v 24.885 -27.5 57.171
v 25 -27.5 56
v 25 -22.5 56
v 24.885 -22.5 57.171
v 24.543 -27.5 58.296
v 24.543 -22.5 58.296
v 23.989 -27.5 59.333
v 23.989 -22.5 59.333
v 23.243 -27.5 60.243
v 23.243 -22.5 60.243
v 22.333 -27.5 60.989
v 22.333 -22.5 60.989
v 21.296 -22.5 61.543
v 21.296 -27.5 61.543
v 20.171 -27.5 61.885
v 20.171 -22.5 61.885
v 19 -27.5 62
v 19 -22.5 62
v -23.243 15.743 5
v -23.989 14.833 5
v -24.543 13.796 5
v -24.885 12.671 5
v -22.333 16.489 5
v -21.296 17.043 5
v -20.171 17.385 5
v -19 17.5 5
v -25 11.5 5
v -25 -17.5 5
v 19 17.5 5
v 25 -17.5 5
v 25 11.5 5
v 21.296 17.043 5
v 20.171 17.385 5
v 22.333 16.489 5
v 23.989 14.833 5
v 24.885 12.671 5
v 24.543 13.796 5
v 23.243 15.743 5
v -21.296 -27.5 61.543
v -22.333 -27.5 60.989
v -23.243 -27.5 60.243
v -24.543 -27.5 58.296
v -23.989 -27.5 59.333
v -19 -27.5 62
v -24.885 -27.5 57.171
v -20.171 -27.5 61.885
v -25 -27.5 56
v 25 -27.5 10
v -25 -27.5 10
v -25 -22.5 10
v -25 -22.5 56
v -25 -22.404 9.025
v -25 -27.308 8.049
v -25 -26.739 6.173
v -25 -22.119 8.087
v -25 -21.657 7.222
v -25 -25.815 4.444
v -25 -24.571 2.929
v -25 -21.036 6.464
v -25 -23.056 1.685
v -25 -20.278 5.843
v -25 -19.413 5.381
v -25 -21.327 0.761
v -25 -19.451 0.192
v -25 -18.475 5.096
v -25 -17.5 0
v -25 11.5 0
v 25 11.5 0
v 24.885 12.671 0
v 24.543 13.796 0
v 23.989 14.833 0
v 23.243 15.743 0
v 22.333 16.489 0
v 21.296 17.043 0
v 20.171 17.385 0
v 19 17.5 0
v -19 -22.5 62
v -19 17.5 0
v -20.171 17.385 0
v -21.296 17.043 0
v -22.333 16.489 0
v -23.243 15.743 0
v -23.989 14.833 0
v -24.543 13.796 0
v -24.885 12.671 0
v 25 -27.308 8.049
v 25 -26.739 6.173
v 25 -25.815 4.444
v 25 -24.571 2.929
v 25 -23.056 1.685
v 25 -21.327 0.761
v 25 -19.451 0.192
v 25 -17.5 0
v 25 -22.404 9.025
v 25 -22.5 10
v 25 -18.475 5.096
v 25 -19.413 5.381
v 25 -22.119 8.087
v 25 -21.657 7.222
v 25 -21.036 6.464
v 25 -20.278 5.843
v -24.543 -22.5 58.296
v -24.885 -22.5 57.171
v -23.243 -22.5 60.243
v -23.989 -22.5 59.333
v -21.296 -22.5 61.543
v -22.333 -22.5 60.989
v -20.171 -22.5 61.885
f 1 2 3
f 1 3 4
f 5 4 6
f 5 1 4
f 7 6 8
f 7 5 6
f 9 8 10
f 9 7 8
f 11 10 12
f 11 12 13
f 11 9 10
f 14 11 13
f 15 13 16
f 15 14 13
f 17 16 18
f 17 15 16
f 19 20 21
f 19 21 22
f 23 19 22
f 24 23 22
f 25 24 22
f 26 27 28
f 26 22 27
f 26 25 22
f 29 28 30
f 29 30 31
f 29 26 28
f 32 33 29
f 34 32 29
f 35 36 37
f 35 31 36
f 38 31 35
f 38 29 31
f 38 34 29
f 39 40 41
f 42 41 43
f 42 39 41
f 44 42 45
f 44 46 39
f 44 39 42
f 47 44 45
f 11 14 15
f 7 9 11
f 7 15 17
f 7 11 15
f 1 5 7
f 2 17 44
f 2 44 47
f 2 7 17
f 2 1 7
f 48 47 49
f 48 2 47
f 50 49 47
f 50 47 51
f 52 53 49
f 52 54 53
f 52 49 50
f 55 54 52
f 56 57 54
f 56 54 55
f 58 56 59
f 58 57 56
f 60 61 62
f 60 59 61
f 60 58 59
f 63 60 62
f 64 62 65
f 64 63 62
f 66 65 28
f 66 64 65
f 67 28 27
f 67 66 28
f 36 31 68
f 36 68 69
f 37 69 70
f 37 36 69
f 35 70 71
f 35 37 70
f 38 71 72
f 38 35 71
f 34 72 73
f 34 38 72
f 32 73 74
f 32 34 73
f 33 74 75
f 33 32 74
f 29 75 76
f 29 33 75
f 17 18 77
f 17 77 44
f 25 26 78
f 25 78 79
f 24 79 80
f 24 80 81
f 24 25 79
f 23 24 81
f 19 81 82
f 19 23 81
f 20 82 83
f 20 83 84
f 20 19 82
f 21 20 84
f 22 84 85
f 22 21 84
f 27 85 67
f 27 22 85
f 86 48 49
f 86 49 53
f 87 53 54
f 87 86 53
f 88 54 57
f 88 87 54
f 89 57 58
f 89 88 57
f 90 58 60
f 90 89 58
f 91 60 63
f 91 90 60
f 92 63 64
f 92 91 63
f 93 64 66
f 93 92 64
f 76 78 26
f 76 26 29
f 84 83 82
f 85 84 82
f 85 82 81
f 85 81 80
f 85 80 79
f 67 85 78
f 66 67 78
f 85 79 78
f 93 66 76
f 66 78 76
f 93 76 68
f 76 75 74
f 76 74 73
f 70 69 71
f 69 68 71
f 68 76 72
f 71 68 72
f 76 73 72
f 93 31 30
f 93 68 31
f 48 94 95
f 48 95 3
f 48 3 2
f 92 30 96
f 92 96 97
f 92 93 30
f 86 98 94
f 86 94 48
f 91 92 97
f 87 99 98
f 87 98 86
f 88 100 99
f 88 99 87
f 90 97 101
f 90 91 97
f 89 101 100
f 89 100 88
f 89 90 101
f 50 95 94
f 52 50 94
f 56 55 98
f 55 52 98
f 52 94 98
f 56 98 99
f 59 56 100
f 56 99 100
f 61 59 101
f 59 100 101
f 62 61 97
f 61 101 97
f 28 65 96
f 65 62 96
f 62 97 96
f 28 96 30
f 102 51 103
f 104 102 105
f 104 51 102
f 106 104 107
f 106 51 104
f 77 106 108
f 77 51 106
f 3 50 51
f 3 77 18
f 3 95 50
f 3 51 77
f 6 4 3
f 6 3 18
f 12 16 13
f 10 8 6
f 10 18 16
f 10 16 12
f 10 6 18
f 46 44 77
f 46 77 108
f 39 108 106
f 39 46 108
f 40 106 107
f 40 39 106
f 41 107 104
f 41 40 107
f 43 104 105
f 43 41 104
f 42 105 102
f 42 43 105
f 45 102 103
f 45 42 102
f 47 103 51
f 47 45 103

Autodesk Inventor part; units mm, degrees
ref_plane "YZ Plane" through (0, 0, 0) normal (1, 0, 0) x (0, 1, 0)
ref_plane "XZ Plane" through (0, 0, 0) normal (0, 1, 0) x (-1, 0, 0)
ref_plane "XY Plane" through (0, 0, 0) normal (0, 0, 1) x (1, 0, 0)
sketch "Schizzo1" plane through (0, 0, 0) normal (0, 0, 1) x (1, 0, 0)
  line L0 (-25, 17.5) -> (25, 17.5)
  line L1 (25, 17.5) -> (25, -17.5)
  line L2 (25, -17.5) -> (-25, -17.5)
  line L3 (-25, -17.5) -> (-25, 17.5)
  line L4 (-25, 17.5) -> (25, -17.5) construction
  line L5 (25, 17.5) -> (-25, -17.5) construction
  point P0 (0, 0)
  dimension "d0" = 50
  dimension "d1" = 35
extrude "Piano1" add sketch "Schizzo1" along normal blind 5
sketch "Schizzo2" plane through (25, -22.5, 10) normal (0, -1, 0) x (1, 0, 0)
  line L0 (-50, 0) -> (0, 0)
  line L1 (0, 0) -> (0, 52)
  line L2 (0, 52) -> (-50, 52)
  line L3 (-50, 52) -> (-50, 0)
edge flange "Flangia1" height 62 angle 90 thickness 5 bend radius 5 thickness toward (0, -1, 0) relief tear relief width 5 relief depth 2.5 edges at (0, -17.5, 5) wall of the first edge with corners at (-25, -22.5, 10) (25, -22.5, 10) (25, -22.5, 62) (-25, -22.5, 62)
bend "Piega (Bend)1"
corner "Angolo1"
fillet "Arrotondamento angolo1" radius 6 4 edges at (-25, 17.5, 2.5) (25, 17.5, 2.5) (25, -25, 62) (-25, -25, 62)
equation "\"d2\" = Spessore"
equation "\"d3\" = LarghezzaScaricoPiega"
equation "\"d4\" = ProfonditàScaricoPiega"
equation "\"d5\" = ResiduoMinimo"
equation "\"d6\" = RaggioTransizione"
equation "\"d9\" = RaggioPiega"
equation "\"d10\" = DimensioniScaricoAngolo"
equation "\"d11\" = DimensioneGioco"
equation "\"d12\" = Dimensione_raggio_Jacobi"
equation "\"RaggioPiega\" = Spessore"
equation "\"LarghezzaScaricoPiega\" = Spessore"
equation "\"ProfonditàScaricoPiega\" = 0.5 * Spessore"
equation "\"RaggioTransizione\" = RaggioPiega"
equation "\"Dimensione_raggio_Jacobi\" = RaggioPiega"
equation "\"DimensioneGioco\" = Spessore"
equation "\"Spessore\" = 5"
equation "\"ResiduoMinimo\" = 10"
equation "\"DimensioniScaricoAngolo\" = 20"
properties part number "Lamiera 10mm supporto asse"
